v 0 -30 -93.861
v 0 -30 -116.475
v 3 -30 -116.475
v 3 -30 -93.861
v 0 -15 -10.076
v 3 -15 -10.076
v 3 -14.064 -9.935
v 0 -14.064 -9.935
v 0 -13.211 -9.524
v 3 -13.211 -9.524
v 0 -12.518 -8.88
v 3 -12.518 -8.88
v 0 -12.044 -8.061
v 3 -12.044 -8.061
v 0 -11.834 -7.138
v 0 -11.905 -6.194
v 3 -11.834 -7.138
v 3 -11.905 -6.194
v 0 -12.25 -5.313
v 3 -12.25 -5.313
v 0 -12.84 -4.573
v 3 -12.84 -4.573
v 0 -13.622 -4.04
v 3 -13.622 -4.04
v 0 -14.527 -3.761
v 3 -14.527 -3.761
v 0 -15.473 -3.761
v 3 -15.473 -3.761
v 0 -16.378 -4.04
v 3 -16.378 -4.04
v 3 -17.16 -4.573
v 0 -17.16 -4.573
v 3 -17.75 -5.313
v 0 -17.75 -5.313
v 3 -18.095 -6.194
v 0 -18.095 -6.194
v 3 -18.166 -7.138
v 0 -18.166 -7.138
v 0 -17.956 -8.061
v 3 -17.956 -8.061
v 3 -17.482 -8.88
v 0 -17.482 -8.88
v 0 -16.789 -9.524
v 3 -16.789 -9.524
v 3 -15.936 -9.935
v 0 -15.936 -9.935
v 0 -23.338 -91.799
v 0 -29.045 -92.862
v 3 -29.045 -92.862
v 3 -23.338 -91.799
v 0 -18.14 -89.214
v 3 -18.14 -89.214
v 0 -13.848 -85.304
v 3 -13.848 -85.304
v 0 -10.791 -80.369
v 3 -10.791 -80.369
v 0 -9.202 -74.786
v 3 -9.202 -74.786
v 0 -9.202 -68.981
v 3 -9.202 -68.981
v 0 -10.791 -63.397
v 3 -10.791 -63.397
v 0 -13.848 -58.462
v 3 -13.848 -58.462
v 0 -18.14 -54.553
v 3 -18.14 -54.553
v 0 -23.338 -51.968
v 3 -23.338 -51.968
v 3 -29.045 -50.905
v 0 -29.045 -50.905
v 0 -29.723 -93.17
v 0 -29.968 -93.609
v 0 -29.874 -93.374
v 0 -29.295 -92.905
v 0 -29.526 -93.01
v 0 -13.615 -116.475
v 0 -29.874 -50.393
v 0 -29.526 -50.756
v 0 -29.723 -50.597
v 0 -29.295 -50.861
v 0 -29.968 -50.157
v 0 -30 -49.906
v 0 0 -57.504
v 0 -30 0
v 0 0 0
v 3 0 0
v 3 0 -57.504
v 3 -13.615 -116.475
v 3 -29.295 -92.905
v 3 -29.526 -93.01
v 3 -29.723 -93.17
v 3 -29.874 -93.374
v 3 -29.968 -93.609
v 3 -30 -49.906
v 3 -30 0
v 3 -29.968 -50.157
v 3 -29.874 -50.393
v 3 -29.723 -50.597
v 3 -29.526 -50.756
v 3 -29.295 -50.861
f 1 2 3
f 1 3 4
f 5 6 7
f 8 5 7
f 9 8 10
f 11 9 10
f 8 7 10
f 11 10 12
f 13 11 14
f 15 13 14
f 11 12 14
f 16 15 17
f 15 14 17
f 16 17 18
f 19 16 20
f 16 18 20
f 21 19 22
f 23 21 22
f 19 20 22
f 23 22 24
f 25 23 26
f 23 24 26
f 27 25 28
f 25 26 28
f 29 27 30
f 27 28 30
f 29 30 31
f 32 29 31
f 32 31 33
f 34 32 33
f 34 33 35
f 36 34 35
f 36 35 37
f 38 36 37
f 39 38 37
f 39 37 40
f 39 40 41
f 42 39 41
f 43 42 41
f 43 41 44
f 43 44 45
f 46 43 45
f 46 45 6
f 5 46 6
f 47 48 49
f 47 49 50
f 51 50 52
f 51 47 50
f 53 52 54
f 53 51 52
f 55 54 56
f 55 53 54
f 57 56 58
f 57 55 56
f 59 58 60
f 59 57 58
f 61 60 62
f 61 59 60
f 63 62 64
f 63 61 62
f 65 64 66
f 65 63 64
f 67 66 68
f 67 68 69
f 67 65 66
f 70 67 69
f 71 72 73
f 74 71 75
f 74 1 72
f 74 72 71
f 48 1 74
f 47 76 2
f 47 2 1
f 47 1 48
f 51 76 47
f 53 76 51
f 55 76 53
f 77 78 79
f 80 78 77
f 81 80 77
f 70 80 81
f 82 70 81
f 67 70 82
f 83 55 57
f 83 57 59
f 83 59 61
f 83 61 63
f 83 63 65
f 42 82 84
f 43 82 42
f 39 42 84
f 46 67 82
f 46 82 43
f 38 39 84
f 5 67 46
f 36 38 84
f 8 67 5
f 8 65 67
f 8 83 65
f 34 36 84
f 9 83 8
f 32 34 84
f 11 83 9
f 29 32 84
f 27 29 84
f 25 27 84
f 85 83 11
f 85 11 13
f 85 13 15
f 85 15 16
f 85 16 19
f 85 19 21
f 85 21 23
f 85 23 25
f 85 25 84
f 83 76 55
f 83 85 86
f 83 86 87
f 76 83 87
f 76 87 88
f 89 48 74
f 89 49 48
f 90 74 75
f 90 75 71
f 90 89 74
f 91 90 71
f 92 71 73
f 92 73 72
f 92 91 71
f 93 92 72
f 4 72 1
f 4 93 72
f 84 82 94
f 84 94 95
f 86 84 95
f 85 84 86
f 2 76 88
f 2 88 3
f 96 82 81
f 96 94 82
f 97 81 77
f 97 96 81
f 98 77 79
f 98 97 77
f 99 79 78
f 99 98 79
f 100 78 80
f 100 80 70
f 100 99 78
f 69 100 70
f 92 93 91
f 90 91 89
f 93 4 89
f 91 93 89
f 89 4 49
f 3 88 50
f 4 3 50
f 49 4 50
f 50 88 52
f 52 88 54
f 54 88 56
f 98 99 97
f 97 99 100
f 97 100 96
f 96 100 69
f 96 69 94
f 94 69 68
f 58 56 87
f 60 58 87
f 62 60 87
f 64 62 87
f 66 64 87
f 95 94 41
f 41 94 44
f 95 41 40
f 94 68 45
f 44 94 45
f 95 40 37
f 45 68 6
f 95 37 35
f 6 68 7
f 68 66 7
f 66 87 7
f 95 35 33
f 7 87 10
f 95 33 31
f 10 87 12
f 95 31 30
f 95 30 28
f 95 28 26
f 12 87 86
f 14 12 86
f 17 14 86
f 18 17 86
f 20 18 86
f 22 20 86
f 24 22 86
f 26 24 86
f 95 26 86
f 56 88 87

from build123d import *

# Parameters (mm, degrees)
BOSS_EXTRUDE1_DEPTH = 3
SKETCH2_R           = 3.175
CUT_EXTRUDE1_DEPTH  = 4
FILLET2_R           = 1


with BuildPart() as part:
    # Sketch1 → Boss-Extrude1 (new body)
    with BuildSketch(Plane(origin=(0, 0, 0), x_dir=(0, 0, -1), z_dir=(1, 0, 0))):
        with BuildLine():
            Line((0, 0), (57.50407585, 0))
            Line((57.50407585, 0), (116.474786715, -13.615081165))
            Line((116.474786715, -13.615081165), (116.474786715, -30))
            Line((116.474786715, -30), (92.883246032, -30))
            ThreePointArc((92.883246032, -30), (71.883246032, -9), (50.883246032, -30))
            Line((50.883246032, -30), (0, -30))
            Line((0, -30), (0, 0))
        make_face()
    extrude(amount=BOSS_EXTRUDE1_DEPTH)

    # Sketch2 → Cut-Extrude1 (cut, through all)
    with BuildSketch(Plane(origin=(3, 0, 0), x_dir=(0, 0, -1), z_dir=(1, 0, 0))):
        with Locations((6.900903962, -15)):
            Circle(SKETCH2_R)
    extrude(amount=-CUT_EXTRUDE1_DEPTH, mode=Mode.SUBTRACT)

    # Fillet2
    fillet2_edges = [part.edges().sort_by_distance(p)[0] for p in [
        (1.5, -30, -92.883246032),
        (1.5, -30, -50.883246032),
    ]]
    fillet(fillet2_edges, radius=FILLET2_R)


solid = part.part
